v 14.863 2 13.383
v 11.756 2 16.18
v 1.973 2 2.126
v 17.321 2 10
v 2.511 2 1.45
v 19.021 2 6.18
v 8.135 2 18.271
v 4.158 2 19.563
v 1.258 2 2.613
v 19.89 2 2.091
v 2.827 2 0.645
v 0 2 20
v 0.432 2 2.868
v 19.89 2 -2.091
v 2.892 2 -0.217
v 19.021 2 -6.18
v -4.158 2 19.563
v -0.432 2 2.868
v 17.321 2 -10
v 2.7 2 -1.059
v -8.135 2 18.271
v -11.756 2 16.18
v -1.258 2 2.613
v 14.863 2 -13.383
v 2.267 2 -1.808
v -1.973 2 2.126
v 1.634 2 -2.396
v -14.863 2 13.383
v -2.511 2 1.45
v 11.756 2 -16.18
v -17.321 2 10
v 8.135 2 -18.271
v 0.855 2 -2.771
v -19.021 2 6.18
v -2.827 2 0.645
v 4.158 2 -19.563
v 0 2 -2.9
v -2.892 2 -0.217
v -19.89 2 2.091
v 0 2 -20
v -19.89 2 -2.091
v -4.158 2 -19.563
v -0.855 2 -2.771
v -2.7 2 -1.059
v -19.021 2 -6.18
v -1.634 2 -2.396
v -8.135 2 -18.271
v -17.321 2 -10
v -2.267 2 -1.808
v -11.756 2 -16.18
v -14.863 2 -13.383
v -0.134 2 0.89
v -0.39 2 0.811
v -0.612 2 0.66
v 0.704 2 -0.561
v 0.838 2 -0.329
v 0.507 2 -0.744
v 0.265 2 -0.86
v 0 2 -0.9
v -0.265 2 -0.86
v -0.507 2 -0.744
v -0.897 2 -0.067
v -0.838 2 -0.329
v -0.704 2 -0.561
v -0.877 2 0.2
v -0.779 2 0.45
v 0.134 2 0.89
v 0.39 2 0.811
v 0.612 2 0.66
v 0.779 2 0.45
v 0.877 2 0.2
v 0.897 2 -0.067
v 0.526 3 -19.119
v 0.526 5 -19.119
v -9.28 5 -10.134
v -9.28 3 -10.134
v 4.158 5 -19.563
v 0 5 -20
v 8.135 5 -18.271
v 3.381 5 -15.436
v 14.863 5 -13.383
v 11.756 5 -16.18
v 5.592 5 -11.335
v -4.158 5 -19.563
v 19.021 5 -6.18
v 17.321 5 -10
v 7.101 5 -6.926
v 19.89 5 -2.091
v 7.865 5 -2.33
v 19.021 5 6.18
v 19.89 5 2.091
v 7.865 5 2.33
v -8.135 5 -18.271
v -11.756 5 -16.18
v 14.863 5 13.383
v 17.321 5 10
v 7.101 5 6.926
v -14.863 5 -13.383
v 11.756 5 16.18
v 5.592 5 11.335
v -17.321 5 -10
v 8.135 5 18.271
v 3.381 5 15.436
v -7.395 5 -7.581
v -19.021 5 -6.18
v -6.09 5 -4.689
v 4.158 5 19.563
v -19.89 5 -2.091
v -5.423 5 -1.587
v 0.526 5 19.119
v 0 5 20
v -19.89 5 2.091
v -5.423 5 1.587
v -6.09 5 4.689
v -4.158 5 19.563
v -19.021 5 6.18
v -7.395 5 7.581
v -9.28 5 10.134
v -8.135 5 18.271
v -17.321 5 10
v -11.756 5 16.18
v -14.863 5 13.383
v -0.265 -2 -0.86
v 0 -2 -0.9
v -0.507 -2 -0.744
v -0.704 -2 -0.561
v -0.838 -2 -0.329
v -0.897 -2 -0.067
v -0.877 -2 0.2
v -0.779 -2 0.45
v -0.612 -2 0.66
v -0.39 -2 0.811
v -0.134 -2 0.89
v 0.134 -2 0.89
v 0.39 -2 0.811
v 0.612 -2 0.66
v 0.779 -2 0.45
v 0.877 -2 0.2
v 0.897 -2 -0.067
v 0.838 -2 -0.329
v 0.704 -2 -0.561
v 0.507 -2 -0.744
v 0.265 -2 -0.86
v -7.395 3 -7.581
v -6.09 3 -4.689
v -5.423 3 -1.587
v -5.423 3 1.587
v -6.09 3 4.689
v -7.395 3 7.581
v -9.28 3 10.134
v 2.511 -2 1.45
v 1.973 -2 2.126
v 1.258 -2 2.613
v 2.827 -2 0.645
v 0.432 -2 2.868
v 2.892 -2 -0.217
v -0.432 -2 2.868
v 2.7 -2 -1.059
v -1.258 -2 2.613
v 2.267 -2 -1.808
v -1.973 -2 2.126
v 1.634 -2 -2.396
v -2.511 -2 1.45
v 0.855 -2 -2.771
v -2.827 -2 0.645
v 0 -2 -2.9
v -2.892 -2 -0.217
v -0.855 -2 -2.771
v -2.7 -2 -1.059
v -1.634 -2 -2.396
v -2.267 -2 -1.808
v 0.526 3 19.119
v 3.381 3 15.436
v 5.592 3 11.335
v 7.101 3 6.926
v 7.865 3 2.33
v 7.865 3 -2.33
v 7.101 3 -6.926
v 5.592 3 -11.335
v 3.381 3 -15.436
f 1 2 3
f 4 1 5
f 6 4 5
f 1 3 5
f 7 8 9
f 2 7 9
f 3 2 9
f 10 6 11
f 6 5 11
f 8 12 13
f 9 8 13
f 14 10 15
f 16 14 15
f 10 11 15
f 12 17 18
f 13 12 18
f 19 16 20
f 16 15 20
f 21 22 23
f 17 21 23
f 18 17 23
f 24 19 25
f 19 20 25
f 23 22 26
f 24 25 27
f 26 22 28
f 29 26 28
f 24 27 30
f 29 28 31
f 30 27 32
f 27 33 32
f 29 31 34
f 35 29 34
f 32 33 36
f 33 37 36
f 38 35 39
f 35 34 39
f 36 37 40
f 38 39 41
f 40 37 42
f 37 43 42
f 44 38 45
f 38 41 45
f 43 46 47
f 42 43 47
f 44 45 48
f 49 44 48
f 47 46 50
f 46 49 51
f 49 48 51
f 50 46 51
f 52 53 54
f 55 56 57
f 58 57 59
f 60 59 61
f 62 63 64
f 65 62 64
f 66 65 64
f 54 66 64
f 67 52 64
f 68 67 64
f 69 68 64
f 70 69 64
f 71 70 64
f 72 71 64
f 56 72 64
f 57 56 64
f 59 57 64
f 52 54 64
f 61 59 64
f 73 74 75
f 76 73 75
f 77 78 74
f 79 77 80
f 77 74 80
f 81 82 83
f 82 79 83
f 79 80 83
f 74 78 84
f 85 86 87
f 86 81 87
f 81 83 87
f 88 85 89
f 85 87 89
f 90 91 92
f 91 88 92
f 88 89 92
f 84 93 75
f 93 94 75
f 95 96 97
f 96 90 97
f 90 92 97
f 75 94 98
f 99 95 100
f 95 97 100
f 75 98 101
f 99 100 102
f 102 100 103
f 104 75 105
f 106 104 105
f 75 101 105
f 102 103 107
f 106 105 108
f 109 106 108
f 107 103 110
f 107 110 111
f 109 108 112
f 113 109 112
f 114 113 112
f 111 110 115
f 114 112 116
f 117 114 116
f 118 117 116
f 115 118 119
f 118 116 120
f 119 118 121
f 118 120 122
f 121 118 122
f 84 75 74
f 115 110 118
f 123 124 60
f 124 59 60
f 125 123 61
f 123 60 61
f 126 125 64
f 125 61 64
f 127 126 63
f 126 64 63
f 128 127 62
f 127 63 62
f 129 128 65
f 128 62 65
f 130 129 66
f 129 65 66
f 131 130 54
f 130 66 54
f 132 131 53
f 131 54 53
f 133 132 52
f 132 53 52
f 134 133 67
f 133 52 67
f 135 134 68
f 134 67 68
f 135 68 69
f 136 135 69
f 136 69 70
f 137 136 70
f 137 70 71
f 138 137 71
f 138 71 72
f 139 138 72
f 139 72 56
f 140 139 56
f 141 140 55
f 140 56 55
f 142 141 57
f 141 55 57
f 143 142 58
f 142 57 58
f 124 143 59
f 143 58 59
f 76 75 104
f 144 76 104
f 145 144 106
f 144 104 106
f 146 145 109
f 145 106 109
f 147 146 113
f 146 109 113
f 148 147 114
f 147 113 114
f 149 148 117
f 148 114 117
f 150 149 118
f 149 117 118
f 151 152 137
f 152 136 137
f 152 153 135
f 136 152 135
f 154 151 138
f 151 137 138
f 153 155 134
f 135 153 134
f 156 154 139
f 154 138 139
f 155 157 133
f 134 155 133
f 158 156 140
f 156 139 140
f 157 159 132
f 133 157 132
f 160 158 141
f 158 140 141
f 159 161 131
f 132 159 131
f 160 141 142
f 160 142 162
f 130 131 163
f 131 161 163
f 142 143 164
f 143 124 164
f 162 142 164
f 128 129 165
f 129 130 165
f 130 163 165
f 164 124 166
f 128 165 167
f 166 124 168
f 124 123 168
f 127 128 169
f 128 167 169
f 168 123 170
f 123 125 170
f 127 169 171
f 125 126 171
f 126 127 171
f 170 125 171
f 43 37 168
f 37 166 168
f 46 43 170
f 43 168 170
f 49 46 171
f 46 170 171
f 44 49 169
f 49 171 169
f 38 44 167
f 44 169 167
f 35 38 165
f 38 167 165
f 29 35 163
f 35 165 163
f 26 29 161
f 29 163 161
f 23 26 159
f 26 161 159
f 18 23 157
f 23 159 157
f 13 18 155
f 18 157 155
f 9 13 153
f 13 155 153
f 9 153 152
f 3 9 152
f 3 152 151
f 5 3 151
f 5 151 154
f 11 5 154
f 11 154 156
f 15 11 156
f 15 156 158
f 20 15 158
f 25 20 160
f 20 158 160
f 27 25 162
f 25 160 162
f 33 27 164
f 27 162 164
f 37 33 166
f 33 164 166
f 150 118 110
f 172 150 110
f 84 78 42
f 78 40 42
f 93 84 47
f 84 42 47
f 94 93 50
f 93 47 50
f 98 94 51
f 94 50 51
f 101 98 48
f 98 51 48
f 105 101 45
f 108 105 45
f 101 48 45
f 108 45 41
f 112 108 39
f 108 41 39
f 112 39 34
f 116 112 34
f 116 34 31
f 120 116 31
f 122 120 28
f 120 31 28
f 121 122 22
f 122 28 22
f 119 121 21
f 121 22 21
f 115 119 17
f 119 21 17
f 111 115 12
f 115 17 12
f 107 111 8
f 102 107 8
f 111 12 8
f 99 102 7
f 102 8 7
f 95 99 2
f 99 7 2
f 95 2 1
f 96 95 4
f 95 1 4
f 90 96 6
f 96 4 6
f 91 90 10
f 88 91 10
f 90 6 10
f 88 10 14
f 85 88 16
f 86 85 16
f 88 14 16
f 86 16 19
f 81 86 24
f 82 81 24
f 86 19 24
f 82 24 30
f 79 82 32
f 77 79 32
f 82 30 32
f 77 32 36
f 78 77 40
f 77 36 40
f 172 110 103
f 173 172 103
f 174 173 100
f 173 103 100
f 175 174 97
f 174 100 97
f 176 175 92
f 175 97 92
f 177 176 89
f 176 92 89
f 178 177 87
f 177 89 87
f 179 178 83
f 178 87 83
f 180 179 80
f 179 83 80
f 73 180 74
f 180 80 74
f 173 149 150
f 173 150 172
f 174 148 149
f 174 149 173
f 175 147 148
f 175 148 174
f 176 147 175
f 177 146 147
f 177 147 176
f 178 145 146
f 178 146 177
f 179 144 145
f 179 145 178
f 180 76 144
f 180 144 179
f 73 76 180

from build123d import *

# Parameters (mm, degrees)
CUT_EXTRUDE1_DEPTH = 2


with BuildPart() as part:
    # Sketch1 → Revolve1 (revolve)
    with BuildSketch(Plane.XY, mode=Mode.PRIVATE) as revolve1_sk:
        Polygon((0.9, -2), (0.9, 2), (0, 2), (0, 5), (20, 5), (20, 2), (2.9, 2), (2.9, -2), align=None)
    revolve(revolve1_sk.sketch.rotate(Axis((0, -3.539189189, 0), (0, 1, 0)), 90), axis=Axis((0, -3.539189189, 0), (0, 1, 0)))

    # Sketch2 → Cut-Extrude1 (cut)
    with BuildSketch(Plane(origin=(0, 5, 0), x_dir=(1, 0, 0), z_dir=(0, 1, 0))):
        with BuildLine():
            Line((0.526272079, 19.119202876), (-9.2795165, 10.133853114))
            ThreePointArc((-9.2795165, 10.133853114), (-5.338676553, 0), (-9.2795165, -10.133853114))
            Line((-9.2795165, -10.133853114), (0.526272079, -19.119202876))
            ThreePointArc((0.526272079, -19.119202876), (7.961323447, 0), (0.526272079, 19.119202876))
        make_face()
    extrude(amount=-CUT_EXTRUDE1_DEPTH, mode=Mode.SUBTRACT)


solid = part.part
